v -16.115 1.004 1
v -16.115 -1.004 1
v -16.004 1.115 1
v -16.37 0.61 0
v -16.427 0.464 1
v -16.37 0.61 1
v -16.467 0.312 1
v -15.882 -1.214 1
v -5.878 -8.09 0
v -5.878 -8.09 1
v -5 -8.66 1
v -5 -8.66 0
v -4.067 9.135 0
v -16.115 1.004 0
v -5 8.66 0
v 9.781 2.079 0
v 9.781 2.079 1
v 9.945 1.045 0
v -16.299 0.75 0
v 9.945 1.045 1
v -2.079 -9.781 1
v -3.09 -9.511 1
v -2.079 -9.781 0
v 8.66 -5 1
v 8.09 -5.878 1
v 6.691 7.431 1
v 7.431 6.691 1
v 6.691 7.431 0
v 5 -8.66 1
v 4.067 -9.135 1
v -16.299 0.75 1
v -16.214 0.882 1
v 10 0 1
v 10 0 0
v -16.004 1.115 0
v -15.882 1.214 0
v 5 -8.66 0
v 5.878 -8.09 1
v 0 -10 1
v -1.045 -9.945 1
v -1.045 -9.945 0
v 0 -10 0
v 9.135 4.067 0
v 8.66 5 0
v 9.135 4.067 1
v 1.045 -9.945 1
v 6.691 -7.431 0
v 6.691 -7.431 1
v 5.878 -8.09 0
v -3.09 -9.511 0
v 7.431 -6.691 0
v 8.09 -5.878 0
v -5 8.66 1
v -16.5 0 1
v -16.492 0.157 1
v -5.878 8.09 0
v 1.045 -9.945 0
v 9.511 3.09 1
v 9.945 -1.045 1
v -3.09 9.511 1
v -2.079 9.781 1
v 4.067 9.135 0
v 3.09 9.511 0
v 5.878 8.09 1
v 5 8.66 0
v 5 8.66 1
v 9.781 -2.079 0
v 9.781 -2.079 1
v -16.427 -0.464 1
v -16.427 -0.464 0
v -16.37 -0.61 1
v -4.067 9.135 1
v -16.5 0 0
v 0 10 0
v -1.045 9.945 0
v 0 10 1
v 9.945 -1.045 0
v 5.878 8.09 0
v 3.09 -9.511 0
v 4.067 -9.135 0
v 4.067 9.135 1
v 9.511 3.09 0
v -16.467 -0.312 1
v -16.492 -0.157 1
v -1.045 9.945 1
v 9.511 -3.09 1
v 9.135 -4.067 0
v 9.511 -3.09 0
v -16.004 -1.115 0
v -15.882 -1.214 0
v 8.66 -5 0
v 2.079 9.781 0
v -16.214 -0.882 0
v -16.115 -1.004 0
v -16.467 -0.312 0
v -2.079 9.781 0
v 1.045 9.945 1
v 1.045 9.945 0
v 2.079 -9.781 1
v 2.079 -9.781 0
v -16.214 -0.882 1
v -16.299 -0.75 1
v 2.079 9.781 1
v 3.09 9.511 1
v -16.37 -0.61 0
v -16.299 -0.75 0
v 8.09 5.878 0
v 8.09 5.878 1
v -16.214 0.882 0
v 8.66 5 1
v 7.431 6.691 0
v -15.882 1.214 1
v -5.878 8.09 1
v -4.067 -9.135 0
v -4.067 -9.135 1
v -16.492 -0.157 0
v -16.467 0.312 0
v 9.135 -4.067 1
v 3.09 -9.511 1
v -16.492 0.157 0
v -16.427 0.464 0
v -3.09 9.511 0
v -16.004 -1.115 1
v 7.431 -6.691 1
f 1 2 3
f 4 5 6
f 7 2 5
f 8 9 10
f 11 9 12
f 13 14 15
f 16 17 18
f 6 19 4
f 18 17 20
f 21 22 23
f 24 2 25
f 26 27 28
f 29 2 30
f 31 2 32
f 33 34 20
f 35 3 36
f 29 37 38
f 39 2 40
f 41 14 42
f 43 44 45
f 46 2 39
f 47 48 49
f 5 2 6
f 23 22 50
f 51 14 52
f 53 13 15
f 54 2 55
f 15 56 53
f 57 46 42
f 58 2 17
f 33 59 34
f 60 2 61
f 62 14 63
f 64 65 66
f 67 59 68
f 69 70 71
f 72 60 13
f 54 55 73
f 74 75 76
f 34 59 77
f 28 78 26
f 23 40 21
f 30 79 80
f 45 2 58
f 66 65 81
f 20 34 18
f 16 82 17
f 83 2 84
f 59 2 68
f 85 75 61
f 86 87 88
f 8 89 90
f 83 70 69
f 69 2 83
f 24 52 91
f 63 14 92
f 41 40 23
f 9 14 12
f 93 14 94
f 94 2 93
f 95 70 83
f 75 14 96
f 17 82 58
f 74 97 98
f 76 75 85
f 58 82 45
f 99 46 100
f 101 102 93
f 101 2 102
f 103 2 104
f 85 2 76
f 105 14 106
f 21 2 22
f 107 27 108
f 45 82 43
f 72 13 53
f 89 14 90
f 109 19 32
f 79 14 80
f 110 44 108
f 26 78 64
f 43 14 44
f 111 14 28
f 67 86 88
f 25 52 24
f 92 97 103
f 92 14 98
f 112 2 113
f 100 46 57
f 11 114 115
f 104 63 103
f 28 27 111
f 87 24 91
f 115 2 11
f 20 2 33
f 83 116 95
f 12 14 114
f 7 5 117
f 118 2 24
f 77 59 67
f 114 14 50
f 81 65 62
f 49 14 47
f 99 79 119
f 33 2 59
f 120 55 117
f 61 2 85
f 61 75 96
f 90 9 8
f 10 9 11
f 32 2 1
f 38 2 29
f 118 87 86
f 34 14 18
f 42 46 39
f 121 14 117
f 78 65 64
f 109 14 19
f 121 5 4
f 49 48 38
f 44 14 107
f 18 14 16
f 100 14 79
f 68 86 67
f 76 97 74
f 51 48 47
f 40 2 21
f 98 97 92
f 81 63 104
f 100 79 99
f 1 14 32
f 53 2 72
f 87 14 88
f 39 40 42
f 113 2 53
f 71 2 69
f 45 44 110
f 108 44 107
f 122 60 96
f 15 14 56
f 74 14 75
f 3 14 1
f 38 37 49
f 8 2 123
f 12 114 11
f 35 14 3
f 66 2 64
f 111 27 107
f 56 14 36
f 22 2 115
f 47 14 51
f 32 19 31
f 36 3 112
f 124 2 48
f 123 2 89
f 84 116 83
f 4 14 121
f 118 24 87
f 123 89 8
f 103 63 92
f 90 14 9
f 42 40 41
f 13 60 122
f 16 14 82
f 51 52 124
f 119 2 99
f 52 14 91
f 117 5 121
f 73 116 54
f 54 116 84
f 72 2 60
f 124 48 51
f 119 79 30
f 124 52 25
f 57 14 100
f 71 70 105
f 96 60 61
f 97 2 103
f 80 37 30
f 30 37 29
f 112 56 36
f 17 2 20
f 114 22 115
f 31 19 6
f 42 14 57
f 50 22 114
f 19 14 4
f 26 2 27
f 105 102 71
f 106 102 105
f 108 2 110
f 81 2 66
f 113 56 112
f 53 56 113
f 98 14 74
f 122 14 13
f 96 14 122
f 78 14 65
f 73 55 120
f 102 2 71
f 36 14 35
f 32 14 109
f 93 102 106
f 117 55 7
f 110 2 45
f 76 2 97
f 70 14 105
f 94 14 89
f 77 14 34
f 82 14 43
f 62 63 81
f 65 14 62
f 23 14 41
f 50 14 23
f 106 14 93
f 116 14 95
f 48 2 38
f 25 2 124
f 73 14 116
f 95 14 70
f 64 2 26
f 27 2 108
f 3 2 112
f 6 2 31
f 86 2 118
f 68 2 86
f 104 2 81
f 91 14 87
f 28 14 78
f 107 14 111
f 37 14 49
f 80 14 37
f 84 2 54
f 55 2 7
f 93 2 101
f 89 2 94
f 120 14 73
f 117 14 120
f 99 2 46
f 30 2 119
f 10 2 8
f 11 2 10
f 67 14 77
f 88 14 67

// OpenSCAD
$fn=60;
hull() {
	cylinder(h=1, d=20);
	translate([-15, 0]) cylinder(h=1, d=3);
}
